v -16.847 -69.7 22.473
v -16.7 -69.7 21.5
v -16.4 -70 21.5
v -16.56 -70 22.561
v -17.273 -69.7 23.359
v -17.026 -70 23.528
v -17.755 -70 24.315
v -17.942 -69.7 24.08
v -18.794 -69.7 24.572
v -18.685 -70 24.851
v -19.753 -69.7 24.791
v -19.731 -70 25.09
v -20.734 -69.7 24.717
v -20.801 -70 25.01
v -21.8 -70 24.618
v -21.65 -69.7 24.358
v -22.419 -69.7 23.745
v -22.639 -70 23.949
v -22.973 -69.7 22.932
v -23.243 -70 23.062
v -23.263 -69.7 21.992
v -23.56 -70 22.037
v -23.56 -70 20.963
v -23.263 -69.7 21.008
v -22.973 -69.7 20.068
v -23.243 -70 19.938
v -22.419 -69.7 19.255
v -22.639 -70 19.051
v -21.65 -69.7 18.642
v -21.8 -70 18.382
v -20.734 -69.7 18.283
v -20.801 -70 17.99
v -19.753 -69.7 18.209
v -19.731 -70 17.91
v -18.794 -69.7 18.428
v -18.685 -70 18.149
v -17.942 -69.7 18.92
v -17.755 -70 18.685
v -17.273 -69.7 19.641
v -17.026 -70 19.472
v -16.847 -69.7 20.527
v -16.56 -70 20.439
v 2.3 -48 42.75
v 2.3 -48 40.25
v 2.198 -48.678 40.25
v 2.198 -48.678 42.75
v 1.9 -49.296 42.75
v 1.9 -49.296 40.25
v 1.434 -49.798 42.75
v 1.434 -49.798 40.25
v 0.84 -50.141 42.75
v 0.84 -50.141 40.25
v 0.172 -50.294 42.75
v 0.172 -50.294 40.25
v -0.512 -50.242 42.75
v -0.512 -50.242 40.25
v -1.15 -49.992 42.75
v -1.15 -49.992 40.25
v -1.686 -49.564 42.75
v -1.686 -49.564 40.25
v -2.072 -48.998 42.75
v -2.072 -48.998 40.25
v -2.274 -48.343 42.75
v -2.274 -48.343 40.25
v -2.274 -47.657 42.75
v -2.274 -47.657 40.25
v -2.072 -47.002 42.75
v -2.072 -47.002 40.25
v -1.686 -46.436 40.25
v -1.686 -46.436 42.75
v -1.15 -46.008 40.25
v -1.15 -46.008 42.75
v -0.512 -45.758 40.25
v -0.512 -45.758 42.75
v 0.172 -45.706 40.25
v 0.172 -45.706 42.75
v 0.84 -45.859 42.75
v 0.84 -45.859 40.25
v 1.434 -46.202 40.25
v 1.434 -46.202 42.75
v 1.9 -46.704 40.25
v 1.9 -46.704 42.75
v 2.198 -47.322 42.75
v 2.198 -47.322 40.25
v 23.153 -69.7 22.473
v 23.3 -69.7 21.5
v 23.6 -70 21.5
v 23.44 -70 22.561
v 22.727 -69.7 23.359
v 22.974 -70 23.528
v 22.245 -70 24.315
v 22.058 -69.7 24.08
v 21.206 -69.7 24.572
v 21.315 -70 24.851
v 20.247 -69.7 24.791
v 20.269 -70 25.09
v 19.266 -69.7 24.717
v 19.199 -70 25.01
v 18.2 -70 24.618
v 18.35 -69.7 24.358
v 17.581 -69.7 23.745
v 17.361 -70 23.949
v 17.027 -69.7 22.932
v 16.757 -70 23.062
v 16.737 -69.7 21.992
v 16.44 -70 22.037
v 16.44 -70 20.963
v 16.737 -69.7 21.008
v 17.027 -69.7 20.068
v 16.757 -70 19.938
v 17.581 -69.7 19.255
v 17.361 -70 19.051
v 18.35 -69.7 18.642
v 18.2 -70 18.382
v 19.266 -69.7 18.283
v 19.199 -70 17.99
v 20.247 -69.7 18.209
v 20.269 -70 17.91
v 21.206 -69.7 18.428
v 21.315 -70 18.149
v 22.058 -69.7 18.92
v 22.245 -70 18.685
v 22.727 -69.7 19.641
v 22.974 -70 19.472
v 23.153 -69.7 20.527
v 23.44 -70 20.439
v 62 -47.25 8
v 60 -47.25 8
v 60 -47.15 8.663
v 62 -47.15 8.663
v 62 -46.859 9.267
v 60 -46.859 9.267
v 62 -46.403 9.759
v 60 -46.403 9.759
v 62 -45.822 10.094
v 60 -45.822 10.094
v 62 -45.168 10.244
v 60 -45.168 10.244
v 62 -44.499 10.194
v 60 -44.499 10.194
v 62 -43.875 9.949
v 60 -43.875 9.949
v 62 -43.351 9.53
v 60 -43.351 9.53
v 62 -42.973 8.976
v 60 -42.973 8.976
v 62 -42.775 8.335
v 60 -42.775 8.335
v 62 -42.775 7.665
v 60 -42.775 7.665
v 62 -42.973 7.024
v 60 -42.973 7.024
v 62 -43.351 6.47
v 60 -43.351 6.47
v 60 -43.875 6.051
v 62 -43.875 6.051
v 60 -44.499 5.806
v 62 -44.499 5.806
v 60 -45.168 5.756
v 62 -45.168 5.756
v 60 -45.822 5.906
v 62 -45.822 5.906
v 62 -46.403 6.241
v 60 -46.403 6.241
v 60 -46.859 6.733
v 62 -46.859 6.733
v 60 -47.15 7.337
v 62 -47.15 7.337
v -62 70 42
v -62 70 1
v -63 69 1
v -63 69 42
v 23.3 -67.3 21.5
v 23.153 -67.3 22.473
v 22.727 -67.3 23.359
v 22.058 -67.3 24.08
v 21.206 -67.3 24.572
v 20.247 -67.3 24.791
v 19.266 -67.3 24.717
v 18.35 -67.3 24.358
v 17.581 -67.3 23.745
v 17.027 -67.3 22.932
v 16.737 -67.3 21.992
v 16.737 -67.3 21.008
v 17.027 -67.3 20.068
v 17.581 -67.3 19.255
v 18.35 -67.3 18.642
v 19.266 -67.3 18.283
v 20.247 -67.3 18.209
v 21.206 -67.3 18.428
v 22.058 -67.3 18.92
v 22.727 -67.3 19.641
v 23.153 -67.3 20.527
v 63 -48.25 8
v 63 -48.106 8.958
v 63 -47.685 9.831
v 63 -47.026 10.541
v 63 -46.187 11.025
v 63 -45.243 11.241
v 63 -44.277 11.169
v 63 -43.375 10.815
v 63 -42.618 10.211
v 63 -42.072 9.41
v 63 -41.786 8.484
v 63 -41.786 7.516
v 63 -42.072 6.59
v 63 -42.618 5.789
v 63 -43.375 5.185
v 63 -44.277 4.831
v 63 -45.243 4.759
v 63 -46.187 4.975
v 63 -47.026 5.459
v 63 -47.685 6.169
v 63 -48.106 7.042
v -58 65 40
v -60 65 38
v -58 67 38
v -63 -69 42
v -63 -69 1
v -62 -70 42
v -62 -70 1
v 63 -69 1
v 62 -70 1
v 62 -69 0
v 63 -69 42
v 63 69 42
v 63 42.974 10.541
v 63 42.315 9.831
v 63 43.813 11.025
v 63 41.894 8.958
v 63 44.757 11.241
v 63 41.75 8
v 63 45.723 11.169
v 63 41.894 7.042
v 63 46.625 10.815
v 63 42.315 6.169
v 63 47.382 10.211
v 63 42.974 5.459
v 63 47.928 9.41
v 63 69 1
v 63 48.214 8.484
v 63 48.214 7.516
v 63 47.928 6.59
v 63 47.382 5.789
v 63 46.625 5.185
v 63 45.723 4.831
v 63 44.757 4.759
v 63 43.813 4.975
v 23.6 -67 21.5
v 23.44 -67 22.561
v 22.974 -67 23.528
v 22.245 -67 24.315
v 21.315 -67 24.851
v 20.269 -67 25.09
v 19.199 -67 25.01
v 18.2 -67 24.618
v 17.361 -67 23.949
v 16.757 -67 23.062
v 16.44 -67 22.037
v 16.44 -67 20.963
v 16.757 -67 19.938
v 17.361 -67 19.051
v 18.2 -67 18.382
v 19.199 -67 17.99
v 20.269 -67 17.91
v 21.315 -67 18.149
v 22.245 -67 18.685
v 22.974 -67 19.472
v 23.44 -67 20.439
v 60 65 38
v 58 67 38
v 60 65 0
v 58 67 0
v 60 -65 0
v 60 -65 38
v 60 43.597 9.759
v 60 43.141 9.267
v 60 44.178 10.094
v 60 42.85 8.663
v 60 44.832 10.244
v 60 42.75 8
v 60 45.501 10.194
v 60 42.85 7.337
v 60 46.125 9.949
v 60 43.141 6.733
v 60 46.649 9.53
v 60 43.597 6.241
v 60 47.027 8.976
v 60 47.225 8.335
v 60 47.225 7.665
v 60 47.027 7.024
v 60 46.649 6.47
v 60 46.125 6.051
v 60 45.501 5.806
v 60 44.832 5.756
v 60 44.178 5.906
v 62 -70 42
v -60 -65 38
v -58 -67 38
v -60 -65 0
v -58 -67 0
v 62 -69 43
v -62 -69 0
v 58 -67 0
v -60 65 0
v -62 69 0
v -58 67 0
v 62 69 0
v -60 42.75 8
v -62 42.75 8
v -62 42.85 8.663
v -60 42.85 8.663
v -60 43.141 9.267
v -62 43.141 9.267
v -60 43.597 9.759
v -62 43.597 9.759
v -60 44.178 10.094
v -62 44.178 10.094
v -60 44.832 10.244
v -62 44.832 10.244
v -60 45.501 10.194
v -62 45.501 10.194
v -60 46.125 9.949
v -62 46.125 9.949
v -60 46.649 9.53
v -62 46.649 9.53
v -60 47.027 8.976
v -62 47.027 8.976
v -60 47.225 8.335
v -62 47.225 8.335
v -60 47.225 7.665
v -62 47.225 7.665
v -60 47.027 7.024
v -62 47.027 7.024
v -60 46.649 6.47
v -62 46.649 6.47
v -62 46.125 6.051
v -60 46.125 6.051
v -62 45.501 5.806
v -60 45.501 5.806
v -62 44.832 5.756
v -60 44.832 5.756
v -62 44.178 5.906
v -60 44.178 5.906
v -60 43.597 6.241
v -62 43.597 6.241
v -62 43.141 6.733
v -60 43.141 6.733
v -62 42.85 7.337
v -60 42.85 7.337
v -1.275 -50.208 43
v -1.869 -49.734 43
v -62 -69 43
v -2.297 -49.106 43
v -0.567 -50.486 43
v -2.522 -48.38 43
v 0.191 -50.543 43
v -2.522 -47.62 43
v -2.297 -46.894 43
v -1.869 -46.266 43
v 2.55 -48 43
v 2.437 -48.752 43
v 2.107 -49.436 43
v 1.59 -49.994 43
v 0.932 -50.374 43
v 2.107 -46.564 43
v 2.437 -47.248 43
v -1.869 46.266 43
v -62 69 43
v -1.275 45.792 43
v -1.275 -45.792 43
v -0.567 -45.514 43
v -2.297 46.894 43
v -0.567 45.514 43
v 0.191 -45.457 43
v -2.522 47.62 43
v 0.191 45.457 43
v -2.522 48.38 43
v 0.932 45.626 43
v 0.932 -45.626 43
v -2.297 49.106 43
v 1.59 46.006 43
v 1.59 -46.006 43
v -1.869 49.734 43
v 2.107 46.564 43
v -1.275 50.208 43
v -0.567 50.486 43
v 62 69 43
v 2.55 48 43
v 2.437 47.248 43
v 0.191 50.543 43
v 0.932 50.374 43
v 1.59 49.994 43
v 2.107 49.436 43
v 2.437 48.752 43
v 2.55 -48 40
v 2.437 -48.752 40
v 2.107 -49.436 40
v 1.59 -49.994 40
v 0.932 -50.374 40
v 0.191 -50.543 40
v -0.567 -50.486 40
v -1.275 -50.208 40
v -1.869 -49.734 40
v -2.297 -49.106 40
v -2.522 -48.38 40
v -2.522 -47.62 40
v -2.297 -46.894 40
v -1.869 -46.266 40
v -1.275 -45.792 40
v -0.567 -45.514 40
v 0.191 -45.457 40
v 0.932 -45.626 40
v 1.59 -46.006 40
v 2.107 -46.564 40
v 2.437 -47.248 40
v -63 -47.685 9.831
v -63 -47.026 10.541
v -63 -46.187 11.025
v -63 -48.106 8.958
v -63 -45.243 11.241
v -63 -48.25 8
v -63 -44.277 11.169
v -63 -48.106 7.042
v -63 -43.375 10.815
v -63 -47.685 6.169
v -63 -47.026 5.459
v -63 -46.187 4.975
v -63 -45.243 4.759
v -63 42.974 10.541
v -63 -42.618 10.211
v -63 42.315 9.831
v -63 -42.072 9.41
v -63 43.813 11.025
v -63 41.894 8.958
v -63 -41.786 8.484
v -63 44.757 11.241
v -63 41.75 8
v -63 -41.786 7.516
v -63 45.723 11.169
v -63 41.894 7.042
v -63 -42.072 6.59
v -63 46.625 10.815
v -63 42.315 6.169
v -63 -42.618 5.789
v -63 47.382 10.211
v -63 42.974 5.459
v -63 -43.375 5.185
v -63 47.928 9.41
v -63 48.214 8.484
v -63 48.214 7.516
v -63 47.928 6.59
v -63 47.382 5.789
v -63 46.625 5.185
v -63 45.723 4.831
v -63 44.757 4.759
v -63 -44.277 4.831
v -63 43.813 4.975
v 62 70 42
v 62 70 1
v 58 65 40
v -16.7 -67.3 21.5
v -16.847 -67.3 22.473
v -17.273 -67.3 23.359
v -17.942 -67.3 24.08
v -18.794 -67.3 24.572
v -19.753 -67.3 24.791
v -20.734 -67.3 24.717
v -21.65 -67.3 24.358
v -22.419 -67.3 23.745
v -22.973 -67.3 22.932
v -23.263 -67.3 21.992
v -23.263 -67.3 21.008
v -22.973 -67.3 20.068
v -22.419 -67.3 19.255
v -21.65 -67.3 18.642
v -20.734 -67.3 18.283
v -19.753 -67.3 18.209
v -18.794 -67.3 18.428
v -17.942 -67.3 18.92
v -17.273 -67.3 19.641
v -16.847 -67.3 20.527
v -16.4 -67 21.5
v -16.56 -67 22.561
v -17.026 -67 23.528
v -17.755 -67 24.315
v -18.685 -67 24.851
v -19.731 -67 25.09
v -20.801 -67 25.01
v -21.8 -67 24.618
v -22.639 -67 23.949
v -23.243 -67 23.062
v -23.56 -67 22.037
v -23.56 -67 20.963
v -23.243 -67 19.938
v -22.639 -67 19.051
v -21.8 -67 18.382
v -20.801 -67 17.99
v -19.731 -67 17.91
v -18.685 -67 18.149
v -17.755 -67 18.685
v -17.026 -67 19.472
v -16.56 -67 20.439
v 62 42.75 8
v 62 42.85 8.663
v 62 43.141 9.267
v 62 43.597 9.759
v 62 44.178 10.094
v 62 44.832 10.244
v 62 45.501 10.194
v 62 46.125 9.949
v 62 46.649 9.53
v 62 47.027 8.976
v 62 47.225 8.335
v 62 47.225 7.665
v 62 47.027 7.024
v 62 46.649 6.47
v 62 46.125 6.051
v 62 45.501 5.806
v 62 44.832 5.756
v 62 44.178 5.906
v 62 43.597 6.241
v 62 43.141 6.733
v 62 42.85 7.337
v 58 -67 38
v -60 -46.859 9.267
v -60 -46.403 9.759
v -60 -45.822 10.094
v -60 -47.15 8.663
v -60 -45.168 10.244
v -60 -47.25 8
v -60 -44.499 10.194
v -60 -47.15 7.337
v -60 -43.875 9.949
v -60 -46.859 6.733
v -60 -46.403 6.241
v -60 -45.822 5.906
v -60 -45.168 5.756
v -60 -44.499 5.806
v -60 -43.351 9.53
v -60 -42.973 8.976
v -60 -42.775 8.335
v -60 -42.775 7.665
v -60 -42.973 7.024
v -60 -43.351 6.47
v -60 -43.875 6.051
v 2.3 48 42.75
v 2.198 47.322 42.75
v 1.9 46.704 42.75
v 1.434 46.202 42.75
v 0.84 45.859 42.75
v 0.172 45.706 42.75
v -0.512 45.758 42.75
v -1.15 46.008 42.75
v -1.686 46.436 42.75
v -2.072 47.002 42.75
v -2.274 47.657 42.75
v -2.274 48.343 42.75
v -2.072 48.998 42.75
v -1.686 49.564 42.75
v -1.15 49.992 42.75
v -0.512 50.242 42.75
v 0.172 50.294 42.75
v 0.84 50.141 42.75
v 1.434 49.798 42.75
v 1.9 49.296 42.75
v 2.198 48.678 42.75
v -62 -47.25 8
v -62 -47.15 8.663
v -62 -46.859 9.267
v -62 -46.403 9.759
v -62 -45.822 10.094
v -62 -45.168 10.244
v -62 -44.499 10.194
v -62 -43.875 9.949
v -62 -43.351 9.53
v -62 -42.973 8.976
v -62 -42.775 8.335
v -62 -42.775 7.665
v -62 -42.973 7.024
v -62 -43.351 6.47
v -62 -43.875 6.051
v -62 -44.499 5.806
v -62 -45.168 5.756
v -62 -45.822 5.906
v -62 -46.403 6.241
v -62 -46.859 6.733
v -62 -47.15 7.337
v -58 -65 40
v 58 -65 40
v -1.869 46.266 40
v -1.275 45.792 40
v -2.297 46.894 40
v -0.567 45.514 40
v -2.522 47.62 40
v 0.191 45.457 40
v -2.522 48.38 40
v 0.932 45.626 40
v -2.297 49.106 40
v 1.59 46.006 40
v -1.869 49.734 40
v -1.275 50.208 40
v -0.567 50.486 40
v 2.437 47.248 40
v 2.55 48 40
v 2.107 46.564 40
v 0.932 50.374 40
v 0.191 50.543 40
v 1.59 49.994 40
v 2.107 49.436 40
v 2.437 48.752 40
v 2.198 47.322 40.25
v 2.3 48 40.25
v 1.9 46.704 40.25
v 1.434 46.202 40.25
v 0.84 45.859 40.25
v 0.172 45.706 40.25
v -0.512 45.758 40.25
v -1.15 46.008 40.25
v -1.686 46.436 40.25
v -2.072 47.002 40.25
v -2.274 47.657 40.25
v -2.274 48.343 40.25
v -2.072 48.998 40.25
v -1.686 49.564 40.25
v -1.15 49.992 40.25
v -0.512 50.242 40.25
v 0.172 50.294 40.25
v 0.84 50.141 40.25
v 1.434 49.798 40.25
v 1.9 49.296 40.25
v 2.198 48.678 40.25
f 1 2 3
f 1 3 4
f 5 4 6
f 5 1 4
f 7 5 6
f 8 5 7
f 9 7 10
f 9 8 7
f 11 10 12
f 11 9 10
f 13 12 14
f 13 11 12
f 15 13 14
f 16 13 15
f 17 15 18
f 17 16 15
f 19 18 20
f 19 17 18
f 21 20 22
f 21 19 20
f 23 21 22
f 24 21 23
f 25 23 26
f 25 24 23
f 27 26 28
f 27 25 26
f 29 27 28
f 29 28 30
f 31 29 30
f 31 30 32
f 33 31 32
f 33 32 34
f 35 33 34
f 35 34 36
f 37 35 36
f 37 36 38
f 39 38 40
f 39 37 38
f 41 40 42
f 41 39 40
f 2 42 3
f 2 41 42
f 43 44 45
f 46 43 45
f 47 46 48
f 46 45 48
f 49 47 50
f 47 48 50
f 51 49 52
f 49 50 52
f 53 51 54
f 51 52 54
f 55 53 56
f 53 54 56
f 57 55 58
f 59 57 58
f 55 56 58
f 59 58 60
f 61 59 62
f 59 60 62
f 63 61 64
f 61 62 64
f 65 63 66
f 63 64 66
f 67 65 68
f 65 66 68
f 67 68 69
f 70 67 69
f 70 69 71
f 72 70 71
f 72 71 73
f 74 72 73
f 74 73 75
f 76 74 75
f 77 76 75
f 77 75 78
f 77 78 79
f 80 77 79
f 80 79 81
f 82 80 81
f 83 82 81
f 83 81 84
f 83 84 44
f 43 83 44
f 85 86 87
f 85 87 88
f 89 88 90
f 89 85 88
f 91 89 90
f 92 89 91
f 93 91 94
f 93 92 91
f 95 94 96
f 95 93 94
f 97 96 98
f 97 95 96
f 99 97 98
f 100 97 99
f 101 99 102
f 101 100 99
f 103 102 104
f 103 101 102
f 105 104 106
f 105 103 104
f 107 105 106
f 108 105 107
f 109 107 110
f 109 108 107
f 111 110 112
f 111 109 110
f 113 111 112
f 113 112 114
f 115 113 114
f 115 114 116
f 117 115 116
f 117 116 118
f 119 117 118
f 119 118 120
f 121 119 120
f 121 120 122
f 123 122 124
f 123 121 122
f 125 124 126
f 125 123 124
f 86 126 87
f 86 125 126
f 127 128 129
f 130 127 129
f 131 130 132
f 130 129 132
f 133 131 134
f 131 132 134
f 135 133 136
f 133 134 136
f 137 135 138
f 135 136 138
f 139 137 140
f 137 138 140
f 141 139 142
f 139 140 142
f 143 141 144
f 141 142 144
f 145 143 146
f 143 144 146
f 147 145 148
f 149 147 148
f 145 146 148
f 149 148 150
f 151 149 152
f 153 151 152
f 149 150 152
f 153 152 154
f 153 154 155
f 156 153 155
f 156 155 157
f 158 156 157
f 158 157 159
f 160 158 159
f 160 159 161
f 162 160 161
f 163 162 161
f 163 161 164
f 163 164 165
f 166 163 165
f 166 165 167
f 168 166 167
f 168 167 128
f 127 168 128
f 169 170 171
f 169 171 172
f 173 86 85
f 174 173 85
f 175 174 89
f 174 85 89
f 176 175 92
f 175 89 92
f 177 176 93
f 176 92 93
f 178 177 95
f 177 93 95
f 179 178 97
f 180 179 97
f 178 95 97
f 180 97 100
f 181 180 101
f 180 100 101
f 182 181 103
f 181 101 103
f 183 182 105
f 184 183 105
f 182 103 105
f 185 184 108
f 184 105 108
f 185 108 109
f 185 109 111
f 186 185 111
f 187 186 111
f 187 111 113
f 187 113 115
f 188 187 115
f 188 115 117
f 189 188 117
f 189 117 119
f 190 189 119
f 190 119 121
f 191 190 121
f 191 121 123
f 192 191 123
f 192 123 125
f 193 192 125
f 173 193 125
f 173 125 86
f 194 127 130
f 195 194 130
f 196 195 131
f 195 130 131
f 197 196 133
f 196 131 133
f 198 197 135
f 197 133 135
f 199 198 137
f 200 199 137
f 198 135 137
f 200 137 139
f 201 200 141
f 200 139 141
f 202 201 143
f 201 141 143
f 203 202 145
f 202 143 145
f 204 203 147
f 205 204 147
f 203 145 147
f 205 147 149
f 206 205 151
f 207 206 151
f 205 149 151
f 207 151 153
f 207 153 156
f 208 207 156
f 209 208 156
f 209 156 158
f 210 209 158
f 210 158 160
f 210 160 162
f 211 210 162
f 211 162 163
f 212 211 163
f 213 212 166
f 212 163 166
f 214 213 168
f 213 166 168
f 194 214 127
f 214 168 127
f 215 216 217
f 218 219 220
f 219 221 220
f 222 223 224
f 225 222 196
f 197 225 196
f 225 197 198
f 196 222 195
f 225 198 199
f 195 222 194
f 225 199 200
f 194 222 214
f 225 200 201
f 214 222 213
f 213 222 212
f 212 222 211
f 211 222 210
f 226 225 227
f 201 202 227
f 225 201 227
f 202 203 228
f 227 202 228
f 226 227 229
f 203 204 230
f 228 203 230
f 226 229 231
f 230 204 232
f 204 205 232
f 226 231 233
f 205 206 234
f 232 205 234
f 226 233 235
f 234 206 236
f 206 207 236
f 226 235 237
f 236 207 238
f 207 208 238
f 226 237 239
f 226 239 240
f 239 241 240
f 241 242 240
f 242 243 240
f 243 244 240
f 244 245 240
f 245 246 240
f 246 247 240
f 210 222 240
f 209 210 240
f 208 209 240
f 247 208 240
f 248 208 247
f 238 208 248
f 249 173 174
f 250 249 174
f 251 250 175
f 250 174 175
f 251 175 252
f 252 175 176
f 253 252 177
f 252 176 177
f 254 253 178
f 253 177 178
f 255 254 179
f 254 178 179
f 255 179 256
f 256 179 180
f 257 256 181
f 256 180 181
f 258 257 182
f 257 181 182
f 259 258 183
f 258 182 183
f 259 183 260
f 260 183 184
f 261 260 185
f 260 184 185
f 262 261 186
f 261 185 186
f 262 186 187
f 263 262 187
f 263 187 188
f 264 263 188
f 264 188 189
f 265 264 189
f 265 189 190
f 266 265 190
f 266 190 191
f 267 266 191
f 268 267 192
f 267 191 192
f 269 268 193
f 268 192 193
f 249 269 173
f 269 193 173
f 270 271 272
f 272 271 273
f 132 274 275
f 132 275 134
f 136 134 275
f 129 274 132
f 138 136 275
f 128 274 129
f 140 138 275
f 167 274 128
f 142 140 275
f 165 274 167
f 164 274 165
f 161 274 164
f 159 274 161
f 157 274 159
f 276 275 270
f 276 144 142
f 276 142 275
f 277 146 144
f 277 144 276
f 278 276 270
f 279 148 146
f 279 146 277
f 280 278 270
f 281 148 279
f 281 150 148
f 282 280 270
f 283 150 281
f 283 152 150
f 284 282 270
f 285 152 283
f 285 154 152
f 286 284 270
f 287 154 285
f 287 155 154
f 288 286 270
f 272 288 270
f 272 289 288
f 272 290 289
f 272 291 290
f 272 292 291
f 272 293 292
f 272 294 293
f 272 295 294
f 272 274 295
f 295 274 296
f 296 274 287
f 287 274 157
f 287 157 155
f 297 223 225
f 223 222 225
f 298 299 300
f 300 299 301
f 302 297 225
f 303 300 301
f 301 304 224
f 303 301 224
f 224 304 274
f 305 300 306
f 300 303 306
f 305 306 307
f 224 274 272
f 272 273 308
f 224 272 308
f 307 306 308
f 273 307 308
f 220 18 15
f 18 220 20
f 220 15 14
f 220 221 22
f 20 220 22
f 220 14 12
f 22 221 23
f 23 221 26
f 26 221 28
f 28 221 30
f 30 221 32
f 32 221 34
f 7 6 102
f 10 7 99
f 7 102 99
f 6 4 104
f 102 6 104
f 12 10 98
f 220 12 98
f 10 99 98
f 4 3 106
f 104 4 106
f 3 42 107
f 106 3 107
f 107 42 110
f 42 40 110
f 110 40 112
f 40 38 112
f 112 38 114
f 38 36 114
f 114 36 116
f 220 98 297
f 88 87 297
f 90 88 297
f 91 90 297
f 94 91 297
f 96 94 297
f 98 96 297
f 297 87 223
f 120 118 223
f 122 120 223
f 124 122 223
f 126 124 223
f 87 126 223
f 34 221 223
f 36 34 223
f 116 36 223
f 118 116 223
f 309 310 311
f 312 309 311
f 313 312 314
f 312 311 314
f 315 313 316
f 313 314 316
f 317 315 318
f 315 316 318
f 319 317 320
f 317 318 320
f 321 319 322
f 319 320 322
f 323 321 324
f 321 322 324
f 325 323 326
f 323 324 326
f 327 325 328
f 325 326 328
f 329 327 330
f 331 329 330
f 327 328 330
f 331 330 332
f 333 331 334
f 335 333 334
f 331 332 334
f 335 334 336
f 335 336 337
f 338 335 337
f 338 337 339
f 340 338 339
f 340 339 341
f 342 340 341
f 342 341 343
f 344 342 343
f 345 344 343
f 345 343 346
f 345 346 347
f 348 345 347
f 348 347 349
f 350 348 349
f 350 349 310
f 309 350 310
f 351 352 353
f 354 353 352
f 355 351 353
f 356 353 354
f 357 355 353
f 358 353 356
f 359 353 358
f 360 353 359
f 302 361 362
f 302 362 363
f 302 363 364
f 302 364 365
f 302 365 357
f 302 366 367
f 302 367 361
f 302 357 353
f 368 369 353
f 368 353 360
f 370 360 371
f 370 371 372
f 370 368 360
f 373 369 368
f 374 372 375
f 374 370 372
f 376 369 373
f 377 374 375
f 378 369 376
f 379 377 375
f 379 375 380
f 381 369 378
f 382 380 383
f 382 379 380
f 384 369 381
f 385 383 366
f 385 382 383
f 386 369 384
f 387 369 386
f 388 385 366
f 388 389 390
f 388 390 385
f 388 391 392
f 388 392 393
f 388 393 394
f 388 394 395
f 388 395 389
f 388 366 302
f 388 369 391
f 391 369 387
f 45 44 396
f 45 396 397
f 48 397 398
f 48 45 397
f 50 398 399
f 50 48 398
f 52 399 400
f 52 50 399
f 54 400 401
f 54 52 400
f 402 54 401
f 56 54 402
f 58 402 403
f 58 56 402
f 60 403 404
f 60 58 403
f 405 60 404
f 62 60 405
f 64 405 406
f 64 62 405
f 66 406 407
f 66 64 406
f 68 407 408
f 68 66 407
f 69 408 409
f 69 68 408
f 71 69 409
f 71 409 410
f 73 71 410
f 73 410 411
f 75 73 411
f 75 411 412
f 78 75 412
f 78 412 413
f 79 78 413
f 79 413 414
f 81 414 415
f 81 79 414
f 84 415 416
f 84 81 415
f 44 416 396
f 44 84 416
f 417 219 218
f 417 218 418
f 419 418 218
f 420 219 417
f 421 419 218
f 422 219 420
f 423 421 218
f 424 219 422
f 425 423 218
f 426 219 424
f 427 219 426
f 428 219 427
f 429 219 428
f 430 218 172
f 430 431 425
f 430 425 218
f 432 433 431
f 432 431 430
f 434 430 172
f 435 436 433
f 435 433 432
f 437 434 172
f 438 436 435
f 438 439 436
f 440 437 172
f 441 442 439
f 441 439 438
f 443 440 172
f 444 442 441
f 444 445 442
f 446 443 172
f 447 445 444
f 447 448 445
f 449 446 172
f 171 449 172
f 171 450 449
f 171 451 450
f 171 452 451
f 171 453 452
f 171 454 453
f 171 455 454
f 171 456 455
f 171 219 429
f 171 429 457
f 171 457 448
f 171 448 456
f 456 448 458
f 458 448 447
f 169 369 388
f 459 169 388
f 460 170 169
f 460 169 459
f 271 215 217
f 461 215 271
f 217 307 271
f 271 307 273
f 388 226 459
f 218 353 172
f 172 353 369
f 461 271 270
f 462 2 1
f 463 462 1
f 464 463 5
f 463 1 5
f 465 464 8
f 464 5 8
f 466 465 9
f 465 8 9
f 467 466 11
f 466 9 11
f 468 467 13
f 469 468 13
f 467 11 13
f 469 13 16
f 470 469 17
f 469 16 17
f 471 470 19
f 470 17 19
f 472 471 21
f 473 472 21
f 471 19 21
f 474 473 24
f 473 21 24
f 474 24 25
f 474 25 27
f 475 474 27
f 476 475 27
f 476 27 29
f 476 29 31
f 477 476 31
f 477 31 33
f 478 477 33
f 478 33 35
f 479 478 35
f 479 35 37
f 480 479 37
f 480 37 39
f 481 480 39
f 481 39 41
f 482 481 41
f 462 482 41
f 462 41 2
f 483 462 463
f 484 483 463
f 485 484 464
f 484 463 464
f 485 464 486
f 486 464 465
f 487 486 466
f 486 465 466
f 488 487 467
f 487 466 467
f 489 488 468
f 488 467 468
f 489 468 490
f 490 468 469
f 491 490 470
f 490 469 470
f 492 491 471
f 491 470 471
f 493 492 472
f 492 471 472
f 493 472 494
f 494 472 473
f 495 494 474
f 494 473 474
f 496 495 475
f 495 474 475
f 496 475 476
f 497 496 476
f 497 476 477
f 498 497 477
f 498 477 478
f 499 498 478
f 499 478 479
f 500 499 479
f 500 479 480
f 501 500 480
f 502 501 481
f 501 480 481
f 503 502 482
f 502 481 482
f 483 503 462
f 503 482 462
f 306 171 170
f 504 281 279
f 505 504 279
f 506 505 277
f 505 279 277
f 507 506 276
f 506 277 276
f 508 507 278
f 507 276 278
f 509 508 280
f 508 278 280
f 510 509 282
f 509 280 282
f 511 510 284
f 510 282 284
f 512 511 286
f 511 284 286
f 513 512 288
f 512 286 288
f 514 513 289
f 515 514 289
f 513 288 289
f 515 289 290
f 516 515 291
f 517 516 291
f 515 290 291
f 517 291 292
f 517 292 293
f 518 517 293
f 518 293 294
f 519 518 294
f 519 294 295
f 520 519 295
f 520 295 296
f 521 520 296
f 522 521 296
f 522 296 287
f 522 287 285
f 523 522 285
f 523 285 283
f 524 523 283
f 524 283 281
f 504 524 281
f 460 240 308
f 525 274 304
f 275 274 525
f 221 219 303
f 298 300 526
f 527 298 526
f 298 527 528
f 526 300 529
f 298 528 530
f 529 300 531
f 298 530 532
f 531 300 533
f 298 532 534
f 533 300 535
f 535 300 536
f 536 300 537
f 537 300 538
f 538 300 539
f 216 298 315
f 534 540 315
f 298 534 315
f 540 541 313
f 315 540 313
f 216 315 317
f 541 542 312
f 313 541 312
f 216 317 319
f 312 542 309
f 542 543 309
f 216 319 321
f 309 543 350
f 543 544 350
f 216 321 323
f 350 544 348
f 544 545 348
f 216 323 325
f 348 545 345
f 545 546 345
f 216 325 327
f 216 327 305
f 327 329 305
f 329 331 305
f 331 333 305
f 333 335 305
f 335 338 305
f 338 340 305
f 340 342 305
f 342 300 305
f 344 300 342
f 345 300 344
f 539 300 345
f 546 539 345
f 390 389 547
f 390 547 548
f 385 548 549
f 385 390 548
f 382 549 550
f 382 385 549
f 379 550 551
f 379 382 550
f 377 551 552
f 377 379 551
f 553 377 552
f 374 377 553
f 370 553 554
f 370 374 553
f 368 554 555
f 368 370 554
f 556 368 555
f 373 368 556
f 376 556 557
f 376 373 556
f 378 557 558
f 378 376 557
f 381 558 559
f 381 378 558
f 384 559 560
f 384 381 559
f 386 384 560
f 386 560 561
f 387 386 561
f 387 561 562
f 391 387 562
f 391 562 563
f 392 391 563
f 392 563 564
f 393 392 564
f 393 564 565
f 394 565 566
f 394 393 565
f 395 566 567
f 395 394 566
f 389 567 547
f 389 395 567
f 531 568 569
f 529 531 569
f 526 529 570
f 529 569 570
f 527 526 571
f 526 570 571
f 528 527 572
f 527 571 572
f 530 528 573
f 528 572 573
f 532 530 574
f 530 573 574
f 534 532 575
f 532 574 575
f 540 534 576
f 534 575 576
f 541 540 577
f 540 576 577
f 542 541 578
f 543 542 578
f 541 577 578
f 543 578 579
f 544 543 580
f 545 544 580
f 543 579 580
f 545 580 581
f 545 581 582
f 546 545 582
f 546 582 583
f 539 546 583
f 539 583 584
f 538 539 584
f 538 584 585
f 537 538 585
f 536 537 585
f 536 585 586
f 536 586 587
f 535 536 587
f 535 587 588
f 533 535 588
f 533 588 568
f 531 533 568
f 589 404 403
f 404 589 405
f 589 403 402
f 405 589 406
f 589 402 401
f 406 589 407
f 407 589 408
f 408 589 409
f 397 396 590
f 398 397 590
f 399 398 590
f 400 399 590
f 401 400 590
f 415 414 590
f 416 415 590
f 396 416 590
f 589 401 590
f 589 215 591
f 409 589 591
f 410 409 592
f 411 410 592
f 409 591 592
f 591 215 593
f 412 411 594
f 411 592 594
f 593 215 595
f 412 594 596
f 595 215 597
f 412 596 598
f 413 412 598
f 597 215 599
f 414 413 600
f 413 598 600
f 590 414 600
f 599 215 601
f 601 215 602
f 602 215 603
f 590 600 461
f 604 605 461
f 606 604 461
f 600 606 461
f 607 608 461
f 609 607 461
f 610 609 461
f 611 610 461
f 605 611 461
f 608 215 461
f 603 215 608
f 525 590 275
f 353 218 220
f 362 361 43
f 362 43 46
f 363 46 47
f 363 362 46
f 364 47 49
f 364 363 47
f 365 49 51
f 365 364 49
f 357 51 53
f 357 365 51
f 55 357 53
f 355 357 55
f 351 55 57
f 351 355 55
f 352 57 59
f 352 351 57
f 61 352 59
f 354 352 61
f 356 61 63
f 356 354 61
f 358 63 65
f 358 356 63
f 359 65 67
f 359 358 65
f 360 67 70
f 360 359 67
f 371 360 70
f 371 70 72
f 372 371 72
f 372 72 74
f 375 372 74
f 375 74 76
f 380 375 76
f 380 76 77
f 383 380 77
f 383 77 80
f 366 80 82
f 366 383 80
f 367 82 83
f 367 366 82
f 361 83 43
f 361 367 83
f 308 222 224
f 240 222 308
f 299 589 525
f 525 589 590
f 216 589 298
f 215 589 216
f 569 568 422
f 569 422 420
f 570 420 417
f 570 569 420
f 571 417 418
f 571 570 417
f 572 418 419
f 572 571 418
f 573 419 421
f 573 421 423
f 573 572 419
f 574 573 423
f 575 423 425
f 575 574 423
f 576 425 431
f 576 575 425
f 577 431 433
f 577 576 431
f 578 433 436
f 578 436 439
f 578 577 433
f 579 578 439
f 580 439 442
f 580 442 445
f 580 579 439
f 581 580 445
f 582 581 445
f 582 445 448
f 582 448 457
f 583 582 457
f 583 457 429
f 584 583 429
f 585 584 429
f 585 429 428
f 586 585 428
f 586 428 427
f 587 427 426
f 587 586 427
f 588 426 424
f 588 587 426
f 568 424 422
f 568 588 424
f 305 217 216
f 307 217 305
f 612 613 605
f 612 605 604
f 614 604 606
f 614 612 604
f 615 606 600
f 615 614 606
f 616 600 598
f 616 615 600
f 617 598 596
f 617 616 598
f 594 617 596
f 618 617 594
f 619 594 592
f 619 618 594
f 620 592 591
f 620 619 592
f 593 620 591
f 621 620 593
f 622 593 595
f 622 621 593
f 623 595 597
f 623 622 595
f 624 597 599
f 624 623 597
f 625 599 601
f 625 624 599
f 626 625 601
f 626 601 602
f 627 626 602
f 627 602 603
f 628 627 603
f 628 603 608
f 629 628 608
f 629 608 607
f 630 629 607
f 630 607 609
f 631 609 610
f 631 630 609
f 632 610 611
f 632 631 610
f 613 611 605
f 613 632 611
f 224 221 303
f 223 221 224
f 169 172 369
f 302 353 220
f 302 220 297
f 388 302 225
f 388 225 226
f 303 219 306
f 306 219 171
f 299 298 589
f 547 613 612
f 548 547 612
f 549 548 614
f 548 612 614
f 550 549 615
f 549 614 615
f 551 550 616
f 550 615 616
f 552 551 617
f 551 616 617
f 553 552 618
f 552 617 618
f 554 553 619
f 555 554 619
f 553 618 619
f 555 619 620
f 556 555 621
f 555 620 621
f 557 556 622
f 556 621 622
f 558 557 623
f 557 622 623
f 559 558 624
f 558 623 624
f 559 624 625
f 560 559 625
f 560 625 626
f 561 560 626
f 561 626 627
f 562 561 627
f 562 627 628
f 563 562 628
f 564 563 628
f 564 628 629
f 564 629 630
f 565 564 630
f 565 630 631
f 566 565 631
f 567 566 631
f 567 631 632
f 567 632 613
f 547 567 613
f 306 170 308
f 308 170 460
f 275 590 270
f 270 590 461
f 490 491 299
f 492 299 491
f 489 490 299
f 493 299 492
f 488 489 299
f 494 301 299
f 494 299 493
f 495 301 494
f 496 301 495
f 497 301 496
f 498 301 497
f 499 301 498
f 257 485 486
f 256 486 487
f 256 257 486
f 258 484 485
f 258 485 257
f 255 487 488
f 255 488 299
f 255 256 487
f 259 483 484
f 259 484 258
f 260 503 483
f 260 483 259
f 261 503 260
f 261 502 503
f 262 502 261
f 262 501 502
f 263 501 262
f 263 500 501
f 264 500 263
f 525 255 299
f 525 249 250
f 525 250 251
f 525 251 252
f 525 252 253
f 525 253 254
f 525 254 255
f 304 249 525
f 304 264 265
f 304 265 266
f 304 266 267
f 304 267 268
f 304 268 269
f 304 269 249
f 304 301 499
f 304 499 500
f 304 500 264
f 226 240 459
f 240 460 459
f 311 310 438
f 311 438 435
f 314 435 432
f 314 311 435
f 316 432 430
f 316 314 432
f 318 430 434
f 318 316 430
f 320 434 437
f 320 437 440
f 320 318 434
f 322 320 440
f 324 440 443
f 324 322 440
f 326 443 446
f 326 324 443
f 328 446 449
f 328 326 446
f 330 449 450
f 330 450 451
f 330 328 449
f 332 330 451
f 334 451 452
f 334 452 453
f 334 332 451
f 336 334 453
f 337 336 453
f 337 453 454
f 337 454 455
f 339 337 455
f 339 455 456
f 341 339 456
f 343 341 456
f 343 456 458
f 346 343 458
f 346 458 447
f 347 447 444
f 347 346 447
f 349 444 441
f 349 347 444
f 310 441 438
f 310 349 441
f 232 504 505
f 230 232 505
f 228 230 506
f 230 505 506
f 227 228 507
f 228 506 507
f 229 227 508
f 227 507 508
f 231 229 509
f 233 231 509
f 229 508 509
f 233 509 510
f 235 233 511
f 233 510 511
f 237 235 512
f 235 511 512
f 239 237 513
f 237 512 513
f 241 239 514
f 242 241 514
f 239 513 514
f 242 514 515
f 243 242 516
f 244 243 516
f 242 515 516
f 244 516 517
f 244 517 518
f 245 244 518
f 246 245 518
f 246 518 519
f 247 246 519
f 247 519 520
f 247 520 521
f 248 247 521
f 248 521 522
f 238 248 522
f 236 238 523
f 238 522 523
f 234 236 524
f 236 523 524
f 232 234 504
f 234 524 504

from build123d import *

# Parameters (mm, degrees)
SKETCH036_W     = 126
SKETCH036_H     = 140
PAD017_DEPTH    = 43
THICKNESS_T     = -3
CHAMFER017_SIZE = 2
SKETCH037_R     = 2.25
POCKET018_DEPTH = 126.001
CHAMFER018_SIZE = 1
SKETCH038_R     = 3.3
POCKET019_DEPTH = 5
CHAMFER019_SIZE = 0.3
SKETCH039_R     = 2.3
POCKET020_DEPTH = 3.001
CHAMFER020_SIZE = 0.25


with BuildPart() as part:
    # Sketch036 → Pad017 (new body)
    with BuildSketch(Plane.XY):
        Rectangle(SKETCH036_W, SKETCH036_H)
    extrude(amount=PAD017_DEPTH)

    # Thickness
    thickness_openings = [part.faces().sort_by_distance(p)[0] for p in [
        (0, 0, 0),
    ]]
    offset(amount=THICKNESS_T, openings=thickness_openings, kind=Kind.INTERSECTION)

    # Chamfer017
    chamfer017_edges = [part.edges().sort_by_distance(p)[0] for p in [
        (-60, -67, 20),
        (-60, 0, 40),
        (0, -67, 40),
        (-60, 67, 20),
        (0, 67, 40),
        (60, 67, 20),
        (60, 0, 40),
        (60, -67, 20),
    ]]
    chamfer(chamfer017_edges, length=CHAMFER017_SIZE)

    # Sketch037 (on Face13 of Chamfer017) → Pocket018 (cut, through all)
    with BuildSketch(Plane(origin=(-63, 0, 0), x_dir=(0, -1, 0), z_dir=(-1, 0, 0))):
        with Locations((-45, 8)):
            Circle(SKETCH037_R)
        with Locations((45, 8)):
            Circle(SKETCH037_R)
    extrude(amount=-POCKET018_DEPTH, mode=Mode.SUBTRACT)

    # Chamfer018
    chamfer018_edges = [part.edges().sort_by_distance(p)[0] for p in [
        (-63, -70, 21.5),
        (-63, 0, 0),
        (-63, 0, 43),
        (-63, 70, 21.5),
        (-63, -42.75, 8),
        (-63, 47.25, 8),
        (63, -70, 21.5),
        (0, -70, 0),
        (0, -70, 43),
        (63, 70, 21.5),
        (63, 0, 0),
        (63, 0, 43),
        (63, -42.75, 8),
        (63, 47.25, 8),
        (0, 70, 0),
        (0, 70, 43),
    ]]
    chamfer(chamfer018_edges, length=CHAMFER018_SIZE)

    # Sketch038 (on Face18 of Chamfer018) → Pocket019 (cut)
    with BuildSketch(Plane.XZ.offset(70)):
        with Locations((-20, 21.5)):
            Circle(SKETCH038_R)
        with Locations((20, 21.5)):
            Circle(SKETCH038_R)
    extrude(amount=-POCKET019_DEPTH, mode=Mode.SUBTRACT)

    # Chamfer019
    chamfer019_edges = [part.edges().sort_by_distance(p)[0] for p in [
        (-23.3, -70, 21.5),
        (-16.7, -68.5, 21.5),
        (-23.3, -67, 21.5),
        (16.7, -70, 21.5),
        (23.3, -68.5, 21.5),
        (16.7, -67, 21.5),
    ]]
    chamfer(chamfer019_edges, length=CHAMFER019_SIZE)

    # Sketch039 (on Face20 of Chamfer019) → Pocket020 (cut, through all)
    with BuildSketch(Plane(origin=(0, 0, 40), x_dir=(1, 0, 0), z_dir=(0, 0, -1))):
        with Locations((0, 48)):
            Circle(SKETCH039_R)
        with Locations((0, -48)):
            Circle(SKETCH039_R)
    extrude(amount=-POCKET020_DEPTH, mode=Mode.SUBTRACT)

    # Chamfer020
    chamfer020_edges = [part.edges().sort_by_distance(p)[0] for p in [
        (-2.3, -48, 40),
        (2.3, -48, 41.5),
        (-2.3, -48, 43),
        (-2.3, 48, 40),
        (2.3, 48, 41.5),
        (-2.3, 48, 43),
    ]]
    chamfer(chamfer020_edges, length=CHAMFER020_SIZE)


solid = part.part
